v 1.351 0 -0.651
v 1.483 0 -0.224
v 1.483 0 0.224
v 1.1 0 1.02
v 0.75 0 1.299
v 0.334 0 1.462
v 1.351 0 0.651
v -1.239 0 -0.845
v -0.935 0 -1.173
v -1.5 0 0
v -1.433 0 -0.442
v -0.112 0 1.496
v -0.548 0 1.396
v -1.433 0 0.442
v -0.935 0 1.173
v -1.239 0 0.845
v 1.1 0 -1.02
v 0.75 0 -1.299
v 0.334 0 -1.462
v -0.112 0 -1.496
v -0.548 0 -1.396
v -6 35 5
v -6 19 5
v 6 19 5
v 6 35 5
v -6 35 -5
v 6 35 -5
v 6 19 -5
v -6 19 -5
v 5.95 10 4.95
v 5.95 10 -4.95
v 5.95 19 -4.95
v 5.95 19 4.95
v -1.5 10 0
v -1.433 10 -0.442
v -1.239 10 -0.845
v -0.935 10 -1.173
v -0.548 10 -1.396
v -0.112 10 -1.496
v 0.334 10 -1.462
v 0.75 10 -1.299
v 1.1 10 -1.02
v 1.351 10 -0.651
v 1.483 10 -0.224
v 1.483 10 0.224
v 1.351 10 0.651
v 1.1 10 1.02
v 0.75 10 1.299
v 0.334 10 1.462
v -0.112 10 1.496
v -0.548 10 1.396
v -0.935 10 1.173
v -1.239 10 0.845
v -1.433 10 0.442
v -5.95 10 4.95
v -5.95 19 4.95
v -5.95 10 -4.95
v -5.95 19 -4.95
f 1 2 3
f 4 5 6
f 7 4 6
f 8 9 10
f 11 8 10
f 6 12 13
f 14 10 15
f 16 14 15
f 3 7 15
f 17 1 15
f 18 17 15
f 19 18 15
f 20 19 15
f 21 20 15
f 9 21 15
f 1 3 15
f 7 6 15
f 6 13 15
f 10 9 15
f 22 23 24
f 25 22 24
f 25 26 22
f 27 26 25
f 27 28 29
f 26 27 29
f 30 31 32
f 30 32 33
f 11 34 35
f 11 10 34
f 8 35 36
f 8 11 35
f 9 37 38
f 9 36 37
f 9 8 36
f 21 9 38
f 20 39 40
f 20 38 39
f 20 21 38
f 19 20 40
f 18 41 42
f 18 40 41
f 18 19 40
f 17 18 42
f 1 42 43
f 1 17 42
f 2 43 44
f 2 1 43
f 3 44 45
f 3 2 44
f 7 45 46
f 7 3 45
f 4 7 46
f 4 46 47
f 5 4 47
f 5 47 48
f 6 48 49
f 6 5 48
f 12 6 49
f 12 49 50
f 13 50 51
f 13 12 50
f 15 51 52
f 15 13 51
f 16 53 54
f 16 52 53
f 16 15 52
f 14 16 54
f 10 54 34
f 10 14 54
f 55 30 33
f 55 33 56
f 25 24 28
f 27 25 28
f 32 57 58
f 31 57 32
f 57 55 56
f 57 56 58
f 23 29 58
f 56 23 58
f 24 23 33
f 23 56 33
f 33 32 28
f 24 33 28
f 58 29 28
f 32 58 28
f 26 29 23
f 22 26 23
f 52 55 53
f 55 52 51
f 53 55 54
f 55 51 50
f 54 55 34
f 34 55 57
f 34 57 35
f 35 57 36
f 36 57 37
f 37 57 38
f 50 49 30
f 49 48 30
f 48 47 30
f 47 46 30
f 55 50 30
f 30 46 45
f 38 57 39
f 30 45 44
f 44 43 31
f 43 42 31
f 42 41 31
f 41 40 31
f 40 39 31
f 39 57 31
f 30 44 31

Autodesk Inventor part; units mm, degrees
ref_plane "YZ Plane" through (0, 0, 0) normal (1, 0, 0) x (0, 1, 0)
ref_plane "XZ Plane" through (0, 0, 0) normal (0, 1, 0) x (-1, 0, 0)
ref_plane "XY Plane" through (0, 0, 0) normal (0, 0, 1) x (1, 0, 0)
sketch "Sketch1" plane through (0, 0, 0) normal (0, 1, 0) x (-1, 0, 0)
  circle A0 centre (0, 0) radius 1.5
  dimension "d0" = 3
extrude "Extrusion1" add sketch "Sketch1" along normal blind 10
sketch "Sketch2" plane through (0, 10, 0) normal (0, 1, 0) x (1, 0, 0)
  line L0 (0, 0) -> (0, 4.95)
  line L1 (0, 4.95) -> (-5.95, 4.95)
  line L2 (-5.95, 4.95) -> (5.95, 4.95)
  line L3 (5.95, 4.95) -> (5.95, -4.95)
  line L4 (5.95, -4.95) -> (-5.95, -4.95)
  line L5 (-5.95, -4.95) -> (-5.95, 4.95)
  dimension "d3" = 4.95
  dimension "d4" = 5.95
  dimension "d5" = 11.9
  dimension "d6" = 9.9
extrude "Extrusion2" add sketch "Sketch2" along normal blind 9
sketch "Sketch3" plane through (0, 19, 0) normal (0, 1, 0) x (1, 0, 0)
  line L0 (0, 0) -> (6, 0)
  line L1 (6, 0) -> (6, 5)
  line L2 (6, 5) -> (-6, 5)
  line L3 (-6, 5) -> (-6, -5)
  line L4 (-6, -5) -> (6, -5)
  line L5 (6, -5) -> (6, 5)
  dimension "d9" = 6
  dimension "d10" = 5
  dimension "d11" = 12
  dimension "d12" = 10
extrude "Extrusion3" add sketch "Sketch3" along normal blind 16
properties part number "motor"
